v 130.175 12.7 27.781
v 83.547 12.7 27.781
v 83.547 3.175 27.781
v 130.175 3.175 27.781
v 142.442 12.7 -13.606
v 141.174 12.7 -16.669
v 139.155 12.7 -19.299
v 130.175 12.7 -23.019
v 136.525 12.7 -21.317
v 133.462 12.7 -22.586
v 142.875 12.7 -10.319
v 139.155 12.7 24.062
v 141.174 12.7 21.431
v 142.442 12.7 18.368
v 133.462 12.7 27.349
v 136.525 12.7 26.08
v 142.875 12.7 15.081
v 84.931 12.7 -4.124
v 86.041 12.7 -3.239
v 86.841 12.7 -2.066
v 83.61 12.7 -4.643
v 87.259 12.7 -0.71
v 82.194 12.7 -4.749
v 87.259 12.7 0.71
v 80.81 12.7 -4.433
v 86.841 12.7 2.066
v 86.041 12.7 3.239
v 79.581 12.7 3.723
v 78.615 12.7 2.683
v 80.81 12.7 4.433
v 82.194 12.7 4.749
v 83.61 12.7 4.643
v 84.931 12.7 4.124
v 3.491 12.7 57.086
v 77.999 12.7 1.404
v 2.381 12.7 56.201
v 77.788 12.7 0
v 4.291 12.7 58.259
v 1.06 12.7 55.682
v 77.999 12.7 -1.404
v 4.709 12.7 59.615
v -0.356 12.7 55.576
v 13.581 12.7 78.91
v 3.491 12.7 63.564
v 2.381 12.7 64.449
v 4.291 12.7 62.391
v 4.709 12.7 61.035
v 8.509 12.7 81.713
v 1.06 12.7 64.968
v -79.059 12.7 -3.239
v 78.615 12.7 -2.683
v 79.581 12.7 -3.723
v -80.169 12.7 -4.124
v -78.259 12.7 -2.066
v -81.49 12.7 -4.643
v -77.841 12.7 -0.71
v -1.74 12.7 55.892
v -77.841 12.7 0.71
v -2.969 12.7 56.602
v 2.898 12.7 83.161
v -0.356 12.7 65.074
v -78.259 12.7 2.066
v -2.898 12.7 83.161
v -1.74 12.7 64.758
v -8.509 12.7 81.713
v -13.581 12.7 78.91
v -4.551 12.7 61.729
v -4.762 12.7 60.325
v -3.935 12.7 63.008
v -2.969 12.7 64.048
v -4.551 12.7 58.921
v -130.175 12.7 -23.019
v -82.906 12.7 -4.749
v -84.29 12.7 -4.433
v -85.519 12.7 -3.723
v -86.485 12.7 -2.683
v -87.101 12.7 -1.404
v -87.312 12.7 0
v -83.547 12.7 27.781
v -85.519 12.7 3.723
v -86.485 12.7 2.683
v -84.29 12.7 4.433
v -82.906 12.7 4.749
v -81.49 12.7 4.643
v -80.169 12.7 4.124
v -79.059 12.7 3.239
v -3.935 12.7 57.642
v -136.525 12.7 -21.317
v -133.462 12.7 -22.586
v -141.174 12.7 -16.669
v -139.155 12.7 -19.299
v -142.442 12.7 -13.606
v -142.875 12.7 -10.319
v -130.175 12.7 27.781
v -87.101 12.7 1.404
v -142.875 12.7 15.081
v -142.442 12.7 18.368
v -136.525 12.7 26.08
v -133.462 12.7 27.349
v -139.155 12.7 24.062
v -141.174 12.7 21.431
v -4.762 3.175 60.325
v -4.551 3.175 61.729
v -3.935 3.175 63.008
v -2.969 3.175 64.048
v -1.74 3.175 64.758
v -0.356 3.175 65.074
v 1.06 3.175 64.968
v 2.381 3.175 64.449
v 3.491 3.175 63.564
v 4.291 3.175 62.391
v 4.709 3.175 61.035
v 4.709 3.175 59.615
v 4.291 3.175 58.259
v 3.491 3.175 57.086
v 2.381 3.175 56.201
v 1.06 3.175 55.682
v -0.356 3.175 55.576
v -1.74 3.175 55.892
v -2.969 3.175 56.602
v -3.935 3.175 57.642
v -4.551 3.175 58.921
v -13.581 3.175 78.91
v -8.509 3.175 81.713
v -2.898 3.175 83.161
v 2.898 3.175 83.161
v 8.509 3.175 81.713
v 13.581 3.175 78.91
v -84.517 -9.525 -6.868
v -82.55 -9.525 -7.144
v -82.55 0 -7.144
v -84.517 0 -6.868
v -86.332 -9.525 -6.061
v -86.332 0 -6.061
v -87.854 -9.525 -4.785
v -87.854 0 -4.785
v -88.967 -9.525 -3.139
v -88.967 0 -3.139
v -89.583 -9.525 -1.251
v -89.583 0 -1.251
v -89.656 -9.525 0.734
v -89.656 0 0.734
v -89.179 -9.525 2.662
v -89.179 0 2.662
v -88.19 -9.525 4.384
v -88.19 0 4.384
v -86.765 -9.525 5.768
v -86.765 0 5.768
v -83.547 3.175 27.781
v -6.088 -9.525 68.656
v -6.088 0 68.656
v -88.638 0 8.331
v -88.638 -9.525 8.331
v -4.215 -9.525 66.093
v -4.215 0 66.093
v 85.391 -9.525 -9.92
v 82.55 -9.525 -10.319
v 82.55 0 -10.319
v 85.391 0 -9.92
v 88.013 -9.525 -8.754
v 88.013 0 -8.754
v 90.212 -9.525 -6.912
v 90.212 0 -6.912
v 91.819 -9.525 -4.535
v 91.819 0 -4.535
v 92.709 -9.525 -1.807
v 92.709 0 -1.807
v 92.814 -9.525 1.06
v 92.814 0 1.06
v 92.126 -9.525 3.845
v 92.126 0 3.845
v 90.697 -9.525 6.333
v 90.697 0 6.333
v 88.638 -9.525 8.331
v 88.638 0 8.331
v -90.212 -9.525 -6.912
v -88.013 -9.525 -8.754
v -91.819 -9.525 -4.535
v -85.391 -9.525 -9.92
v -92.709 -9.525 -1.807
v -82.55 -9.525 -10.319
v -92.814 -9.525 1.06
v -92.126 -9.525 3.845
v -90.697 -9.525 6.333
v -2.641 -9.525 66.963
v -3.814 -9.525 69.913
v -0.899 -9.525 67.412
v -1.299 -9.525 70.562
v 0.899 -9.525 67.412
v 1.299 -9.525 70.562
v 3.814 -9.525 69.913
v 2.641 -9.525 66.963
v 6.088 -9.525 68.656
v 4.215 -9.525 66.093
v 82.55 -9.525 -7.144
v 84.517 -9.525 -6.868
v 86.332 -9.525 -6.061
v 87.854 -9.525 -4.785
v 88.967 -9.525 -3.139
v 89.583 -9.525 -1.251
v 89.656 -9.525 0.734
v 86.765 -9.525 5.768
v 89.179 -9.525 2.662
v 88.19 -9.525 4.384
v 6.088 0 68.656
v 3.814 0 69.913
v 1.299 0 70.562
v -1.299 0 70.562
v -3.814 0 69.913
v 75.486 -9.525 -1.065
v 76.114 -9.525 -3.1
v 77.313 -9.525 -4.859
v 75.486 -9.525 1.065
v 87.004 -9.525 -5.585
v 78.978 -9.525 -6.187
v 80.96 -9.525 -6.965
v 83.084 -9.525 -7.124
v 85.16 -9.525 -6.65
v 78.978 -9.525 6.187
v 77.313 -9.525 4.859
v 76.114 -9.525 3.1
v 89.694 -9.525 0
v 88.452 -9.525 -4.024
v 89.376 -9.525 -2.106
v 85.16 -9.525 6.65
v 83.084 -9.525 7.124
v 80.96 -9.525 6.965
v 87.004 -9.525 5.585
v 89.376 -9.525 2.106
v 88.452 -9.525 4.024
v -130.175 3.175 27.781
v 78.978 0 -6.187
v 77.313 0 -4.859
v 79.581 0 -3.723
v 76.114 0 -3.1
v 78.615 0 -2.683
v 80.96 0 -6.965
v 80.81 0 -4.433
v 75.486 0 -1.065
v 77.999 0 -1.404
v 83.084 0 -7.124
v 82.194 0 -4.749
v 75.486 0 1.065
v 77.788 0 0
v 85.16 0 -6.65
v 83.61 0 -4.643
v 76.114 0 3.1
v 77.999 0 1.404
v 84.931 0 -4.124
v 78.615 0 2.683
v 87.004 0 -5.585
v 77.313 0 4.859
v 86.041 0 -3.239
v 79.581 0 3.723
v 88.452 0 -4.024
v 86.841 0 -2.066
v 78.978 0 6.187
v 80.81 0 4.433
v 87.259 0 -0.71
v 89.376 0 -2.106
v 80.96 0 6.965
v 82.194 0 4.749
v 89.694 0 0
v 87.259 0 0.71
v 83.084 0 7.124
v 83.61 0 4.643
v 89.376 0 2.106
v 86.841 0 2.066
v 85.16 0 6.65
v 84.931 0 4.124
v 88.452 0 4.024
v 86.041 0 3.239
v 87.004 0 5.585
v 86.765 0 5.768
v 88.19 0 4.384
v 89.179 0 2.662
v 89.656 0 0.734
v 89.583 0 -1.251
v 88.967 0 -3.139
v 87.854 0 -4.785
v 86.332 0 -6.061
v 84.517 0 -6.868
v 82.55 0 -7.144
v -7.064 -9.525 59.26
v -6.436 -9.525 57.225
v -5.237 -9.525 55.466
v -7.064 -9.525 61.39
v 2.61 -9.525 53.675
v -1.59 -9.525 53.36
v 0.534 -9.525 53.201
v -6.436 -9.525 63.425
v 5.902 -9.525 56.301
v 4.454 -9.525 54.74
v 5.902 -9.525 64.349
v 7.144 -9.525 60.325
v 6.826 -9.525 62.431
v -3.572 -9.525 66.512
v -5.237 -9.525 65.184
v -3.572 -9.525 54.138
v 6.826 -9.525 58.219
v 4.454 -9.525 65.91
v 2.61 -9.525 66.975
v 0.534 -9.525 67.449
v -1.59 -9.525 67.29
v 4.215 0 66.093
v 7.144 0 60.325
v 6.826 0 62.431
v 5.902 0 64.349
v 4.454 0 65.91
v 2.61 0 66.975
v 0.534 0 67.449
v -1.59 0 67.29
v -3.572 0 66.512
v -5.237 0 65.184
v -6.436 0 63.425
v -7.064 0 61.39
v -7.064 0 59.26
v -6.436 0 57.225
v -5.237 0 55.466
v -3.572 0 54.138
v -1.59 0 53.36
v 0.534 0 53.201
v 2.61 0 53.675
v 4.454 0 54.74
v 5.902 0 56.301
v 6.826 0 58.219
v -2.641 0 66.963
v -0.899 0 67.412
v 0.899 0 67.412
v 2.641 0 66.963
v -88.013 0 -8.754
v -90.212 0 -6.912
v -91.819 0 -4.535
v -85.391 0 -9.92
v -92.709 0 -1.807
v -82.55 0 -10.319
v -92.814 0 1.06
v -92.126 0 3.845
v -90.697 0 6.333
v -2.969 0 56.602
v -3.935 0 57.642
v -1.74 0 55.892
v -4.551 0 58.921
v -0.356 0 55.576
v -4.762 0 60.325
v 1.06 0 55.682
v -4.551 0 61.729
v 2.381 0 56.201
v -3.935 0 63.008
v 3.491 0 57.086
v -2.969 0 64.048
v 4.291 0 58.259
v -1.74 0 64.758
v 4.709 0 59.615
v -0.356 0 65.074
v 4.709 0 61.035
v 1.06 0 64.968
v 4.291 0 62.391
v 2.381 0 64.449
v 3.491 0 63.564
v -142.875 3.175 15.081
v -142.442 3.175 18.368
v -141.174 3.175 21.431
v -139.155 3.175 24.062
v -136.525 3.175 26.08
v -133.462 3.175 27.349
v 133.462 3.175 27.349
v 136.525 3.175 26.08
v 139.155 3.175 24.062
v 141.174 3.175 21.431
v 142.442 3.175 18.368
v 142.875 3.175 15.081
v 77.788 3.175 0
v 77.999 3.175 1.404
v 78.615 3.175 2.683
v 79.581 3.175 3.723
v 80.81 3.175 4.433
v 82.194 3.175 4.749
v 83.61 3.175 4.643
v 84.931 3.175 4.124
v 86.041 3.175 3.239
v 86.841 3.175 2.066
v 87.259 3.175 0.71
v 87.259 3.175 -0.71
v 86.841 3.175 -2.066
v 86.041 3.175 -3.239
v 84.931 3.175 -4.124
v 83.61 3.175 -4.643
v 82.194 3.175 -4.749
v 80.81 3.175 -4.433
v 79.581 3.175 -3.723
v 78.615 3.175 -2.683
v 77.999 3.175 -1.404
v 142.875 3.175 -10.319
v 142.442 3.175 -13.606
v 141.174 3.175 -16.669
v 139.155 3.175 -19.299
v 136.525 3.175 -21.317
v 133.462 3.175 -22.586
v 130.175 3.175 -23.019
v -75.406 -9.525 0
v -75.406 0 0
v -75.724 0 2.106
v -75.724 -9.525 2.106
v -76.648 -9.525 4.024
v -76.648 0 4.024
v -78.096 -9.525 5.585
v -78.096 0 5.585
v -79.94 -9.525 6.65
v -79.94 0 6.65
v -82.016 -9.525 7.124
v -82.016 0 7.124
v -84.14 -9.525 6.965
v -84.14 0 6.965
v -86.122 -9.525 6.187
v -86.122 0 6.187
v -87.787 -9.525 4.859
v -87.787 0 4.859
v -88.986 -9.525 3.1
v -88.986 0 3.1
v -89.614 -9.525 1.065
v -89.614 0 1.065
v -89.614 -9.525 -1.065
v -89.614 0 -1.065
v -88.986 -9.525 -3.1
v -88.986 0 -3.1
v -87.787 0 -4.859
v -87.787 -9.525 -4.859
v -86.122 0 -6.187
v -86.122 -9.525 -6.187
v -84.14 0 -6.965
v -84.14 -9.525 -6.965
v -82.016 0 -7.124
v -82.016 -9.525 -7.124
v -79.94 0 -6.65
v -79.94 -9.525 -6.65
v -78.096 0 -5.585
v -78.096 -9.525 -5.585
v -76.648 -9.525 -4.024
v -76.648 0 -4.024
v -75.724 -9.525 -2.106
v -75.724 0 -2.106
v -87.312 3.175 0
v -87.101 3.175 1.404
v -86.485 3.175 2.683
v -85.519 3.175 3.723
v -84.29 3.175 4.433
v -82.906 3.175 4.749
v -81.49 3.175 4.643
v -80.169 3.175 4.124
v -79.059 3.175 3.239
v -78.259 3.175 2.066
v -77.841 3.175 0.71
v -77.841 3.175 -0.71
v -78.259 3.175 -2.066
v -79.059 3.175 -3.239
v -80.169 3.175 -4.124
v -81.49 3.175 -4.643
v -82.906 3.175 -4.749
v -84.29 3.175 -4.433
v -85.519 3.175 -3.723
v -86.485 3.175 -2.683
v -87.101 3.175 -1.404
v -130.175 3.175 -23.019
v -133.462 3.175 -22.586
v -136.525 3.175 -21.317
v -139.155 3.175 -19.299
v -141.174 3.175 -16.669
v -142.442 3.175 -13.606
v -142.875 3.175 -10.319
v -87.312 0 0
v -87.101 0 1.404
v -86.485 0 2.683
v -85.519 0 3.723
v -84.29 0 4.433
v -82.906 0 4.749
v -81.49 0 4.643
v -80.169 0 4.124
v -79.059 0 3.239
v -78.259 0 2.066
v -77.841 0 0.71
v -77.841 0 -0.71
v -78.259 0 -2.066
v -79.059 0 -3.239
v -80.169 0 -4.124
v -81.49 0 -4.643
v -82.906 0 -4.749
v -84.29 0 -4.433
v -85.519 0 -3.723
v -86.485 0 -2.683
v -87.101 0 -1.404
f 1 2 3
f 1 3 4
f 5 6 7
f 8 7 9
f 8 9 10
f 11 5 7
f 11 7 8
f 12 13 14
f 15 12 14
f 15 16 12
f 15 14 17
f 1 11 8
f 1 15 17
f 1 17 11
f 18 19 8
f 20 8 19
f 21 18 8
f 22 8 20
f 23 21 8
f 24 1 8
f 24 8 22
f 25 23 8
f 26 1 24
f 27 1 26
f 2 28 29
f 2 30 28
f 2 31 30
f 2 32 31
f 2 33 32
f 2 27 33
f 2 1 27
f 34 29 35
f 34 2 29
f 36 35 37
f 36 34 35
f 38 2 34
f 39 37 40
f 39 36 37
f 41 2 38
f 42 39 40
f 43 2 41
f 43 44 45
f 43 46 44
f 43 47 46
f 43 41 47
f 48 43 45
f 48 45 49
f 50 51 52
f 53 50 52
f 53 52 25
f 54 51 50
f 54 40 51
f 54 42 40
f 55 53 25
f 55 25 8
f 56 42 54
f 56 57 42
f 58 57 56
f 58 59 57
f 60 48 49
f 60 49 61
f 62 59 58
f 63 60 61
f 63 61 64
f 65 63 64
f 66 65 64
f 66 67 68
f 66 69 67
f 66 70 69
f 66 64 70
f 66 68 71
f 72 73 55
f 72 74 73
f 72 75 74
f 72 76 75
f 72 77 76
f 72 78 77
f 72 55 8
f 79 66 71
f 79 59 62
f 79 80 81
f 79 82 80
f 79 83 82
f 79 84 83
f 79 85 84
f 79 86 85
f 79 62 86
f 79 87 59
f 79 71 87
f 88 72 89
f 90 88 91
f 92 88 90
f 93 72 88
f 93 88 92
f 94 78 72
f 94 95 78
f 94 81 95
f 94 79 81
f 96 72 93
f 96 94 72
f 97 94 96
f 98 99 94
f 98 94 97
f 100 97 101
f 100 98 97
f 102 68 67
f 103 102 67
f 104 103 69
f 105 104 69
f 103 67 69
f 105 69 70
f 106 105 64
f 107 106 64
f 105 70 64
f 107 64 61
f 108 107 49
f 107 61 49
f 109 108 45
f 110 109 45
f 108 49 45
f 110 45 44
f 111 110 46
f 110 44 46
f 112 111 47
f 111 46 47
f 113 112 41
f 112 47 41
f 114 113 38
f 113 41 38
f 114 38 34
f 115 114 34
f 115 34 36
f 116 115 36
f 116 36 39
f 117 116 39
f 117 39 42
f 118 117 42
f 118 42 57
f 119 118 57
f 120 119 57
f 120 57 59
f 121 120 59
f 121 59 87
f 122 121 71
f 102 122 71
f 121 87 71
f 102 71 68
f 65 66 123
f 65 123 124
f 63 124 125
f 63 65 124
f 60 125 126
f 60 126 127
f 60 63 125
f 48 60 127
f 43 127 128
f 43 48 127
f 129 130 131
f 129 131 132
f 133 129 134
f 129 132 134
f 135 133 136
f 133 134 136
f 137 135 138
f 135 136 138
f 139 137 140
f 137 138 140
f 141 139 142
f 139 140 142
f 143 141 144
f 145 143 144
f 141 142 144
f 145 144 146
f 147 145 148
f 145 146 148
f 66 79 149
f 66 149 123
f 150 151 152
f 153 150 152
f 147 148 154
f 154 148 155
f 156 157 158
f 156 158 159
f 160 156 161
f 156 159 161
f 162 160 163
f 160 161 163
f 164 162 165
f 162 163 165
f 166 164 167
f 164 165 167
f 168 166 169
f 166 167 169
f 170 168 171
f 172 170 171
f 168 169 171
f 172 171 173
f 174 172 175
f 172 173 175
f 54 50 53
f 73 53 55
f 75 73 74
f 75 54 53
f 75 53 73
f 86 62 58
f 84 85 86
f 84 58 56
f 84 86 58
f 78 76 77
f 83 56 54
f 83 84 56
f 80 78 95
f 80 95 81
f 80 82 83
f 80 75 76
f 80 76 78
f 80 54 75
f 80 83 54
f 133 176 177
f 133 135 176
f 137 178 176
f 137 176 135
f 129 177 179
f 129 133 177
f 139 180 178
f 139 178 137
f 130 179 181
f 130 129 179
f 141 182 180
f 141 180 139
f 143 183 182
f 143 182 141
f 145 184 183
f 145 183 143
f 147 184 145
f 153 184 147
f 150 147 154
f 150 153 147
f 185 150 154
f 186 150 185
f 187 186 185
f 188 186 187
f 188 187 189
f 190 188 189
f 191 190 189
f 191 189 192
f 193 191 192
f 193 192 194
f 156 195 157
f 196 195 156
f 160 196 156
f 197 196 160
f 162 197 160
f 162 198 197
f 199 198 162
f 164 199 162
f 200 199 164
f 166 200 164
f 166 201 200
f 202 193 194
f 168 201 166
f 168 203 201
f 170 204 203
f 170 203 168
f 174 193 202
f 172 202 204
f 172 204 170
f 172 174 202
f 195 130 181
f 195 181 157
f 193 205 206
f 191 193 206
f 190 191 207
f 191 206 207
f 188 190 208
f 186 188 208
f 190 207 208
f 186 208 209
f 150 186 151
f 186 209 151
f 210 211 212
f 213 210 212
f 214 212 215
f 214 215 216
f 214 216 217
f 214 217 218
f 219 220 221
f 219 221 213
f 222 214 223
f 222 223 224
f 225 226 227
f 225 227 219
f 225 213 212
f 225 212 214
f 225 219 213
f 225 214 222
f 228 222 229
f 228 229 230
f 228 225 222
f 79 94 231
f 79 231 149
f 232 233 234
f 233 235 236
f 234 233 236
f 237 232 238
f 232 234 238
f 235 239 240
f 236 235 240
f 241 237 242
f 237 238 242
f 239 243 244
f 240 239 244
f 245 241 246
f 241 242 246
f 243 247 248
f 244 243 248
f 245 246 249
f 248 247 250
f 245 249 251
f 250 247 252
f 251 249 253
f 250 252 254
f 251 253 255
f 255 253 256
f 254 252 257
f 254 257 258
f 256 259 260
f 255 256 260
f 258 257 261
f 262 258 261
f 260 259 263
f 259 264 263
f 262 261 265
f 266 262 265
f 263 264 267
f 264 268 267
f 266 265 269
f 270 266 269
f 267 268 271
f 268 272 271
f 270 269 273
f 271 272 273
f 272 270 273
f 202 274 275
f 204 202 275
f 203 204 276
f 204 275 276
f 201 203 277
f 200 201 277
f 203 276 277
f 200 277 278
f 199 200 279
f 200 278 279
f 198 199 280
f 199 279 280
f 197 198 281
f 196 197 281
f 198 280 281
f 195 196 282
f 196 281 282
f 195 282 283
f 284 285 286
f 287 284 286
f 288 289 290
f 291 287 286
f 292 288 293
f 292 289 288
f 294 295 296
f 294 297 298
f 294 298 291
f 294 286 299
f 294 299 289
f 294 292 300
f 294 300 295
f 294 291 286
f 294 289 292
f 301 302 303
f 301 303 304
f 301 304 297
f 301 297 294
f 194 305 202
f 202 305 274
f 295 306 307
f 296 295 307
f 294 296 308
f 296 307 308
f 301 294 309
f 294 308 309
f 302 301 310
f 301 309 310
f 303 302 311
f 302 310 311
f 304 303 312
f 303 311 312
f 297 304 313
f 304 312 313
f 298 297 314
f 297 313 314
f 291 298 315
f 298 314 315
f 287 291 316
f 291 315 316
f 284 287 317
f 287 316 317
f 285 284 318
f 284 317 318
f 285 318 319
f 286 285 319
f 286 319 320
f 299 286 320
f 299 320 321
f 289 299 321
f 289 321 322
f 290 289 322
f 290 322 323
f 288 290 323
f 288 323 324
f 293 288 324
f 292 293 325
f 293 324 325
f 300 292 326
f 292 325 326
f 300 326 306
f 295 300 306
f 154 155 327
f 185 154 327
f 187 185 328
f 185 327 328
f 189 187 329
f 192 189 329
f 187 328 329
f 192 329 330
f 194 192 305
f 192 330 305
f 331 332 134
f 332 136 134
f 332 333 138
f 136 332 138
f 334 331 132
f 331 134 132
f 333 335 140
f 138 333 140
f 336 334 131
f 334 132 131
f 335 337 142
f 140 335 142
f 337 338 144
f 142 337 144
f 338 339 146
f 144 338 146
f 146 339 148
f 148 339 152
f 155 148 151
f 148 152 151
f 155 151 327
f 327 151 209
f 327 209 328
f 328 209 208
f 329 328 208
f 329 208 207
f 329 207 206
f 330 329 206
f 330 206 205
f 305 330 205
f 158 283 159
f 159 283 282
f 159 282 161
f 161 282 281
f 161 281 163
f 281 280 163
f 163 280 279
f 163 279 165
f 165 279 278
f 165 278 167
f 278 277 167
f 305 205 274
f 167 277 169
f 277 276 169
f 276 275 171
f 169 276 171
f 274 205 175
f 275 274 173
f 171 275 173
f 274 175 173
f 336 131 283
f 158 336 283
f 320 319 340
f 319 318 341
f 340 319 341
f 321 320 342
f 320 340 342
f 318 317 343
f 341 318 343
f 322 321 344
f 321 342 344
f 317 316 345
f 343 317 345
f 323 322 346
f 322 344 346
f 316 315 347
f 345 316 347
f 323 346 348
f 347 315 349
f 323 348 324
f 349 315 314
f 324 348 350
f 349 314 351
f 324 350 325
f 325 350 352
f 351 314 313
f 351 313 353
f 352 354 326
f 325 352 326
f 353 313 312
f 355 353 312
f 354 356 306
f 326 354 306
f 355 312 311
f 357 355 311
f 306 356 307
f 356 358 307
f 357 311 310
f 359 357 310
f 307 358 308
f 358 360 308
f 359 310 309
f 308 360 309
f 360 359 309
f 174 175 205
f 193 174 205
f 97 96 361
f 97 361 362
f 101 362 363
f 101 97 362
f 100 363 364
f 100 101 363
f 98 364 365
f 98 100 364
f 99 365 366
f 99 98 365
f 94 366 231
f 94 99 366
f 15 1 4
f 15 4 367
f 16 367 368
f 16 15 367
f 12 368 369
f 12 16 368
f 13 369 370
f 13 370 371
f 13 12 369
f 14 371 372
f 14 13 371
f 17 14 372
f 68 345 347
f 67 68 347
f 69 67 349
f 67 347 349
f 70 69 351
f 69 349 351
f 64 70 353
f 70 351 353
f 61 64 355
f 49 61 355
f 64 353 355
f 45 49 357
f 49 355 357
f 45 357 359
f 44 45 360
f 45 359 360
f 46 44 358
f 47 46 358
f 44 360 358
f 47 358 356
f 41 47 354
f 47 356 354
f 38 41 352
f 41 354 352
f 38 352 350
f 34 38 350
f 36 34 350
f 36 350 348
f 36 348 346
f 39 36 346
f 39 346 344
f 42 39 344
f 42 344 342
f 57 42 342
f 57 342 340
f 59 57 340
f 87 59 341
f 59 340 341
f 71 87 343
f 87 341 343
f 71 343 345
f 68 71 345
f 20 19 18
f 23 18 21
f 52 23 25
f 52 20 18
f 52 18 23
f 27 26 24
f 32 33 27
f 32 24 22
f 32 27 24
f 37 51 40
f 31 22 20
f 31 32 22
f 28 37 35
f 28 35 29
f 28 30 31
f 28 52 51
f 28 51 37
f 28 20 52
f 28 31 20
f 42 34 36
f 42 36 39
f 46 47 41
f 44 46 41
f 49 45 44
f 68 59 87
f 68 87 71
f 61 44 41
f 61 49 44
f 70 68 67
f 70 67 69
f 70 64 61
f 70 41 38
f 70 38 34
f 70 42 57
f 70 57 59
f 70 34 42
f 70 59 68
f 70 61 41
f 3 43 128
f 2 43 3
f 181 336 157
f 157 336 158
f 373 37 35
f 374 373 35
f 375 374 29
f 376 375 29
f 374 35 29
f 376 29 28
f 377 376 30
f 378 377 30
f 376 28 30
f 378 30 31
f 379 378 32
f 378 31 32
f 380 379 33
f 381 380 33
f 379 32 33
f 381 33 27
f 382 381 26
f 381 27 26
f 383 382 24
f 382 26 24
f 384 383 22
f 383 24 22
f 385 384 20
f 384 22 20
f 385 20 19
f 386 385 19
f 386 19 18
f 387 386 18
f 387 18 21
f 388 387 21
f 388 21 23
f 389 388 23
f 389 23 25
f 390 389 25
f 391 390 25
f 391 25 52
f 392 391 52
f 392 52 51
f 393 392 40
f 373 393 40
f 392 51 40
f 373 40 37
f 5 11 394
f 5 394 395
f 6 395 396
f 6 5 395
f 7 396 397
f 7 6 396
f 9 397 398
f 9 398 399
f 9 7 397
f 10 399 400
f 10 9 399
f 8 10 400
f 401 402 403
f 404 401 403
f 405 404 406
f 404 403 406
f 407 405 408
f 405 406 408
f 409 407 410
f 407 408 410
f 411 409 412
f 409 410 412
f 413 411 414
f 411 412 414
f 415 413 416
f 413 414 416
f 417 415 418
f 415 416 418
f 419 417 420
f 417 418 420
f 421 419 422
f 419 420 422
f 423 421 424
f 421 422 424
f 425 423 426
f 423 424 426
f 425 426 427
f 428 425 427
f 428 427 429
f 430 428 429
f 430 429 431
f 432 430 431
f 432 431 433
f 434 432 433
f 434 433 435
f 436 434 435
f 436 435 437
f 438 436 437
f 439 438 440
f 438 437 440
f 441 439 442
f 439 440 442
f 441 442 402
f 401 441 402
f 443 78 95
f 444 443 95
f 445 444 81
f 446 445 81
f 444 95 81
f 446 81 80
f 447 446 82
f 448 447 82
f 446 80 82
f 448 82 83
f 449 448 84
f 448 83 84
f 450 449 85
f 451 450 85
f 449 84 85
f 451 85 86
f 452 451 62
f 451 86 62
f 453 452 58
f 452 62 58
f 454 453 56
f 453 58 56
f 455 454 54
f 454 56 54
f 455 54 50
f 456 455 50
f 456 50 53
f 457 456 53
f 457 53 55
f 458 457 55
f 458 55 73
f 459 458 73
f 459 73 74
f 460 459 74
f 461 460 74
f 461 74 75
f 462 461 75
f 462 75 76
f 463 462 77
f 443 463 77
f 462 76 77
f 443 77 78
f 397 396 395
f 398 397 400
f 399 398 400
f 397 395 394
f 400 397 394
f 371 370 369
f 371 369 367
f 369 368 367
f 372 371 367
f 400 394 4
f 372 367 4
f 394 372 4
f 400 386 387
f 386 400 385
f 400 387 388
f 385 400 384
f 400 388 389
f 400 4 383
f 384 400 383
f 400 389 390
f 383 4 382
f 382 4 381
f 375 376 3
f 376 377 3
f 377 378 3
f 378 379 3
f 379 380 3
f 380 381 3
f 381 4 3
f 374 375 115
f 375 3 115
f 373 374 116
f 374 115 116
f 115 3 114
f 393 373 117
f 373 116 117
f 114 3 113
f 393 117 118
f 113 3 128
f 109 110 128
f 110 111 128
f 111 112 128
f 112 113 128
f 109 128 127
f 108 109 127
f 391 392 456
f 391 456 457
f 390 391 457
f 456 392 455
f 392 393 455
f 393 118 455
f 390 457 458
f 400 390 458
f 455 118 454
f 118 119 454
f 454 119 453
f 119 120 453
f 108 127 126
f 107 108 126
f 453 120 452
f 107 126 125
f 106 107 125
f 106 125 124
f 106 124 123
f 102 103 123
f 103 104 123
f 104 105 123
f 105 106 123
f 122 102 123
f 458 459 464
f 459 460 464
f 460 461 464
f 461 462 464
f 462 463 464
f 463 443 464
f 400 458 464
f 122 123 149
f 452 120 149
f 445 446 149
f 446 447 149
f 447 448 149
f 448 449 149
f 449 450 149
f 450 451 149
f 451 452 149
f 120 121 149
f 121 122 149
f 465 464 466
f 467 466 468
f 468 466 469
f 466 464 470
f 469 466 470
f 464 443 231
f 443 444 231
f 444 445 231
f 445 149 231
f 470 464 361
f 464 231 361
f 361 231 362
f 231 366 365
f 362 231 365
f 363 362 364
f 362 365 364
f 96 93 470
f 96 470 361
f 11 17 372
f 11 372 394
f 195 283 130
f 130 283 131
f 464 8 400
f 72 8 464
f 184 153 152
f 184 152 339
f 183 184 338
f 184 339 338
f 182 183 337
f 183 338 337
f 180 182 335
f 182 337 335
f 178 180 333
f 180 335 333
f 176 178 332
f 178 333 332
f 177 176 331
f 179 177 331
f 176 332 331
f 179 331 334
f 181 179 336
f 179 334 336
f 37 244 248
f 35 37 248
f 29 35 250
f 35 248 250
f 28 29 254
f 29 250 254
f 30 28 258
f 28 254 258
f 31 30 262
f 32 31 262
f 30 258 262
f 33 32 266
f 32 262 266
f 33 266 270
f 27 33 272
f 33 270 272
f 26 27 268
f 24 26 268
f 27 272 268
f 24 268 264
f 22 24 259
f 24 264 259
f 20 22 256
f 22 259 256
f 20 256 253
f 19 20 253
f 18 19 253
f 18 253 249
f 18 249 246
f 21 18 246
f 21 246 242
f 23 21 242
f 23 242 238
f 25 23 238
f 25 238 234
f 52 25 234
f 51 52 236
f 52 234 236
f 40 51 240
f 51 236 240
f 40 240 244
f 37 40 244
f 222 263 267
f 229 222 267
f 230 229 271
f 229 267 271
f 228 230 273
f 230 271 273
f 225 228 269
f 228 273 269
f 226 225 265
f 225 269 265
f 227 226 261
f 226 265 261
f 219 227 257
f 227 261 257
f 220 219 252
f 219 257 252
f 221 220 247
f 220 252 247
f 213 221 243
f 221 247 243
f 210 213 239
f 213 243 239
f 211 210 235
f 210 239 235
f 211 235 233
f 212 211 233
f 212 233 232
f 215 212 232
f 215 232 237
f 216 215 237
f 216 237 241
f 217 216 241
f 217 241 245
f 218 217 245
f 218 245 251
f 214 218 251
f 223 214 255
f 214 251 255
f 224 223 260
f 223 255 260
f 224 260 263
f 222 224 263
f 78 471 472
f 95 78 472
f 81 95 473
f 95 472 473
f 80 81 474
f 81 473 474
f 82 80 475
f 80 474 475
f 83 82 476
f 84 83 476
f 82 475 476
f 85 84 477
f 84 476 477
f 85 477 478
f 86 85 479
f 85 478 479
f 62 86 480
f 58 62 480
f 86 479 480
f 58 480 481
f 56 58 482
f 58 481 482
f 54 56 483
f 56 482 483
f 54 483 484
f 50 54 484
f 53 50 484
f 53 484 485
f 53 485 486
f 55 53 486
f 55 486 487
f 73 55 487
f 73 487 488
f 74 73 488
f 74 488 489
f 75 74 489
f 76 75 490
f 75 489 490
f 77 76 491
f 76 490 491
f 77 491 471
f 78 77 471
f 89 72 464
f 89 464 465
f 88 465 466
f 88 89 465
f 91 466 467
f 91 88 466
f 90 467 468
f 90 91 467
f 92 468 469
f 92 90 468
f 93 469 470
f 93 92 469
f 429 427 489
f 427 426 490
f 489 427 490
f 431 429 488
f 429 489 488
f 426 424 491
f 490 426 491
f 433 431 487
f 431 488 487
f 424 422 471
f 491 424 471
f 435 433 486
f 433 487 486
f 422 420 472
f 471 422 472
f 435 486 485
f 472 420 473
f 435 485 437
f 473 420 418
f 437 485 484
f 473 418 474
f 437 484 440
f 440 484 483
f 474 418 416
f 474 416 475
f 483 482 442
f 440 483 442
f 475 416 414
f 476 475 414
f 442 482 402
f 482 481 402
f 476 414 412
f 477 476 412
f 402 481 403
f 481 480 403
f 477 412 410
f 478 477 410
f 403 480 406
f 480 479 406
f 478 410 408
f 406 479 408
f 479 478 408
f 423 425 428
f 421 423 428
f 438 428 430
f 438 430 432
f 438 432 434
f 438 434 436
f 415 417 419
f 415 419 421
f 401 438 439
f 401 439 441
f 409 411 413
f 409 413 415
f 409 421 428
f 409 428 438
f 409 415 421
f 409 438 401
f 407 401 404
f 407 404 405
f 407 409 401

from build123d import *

# Parameters (mm, degrees)
F0_R     = 7.14375
F1_DEPTH = 9.525
F3_DEPTH = 9.525
F4_R     = 4.7625
F5_DEPTH = 12.7
F6_R     = 4.7625
F7_DEPTH = 9.525


with BuildPart() as f1:
    # F0 (on Front) → F1 (new body)
    with BuildSketch(Plane.XZ):
        with Locations((0, 60.325)):
            Circle(F0_R)
        with Locations((-82.55, 0)):
            Circle(F0_R)
        with Locations((82.55, 0)):
            Circle(F0_R)
    extrude(amount=F1_DEPTH)

    # F4 (on face) → F5 (join)
    with BuildSketch(Plane(origin=(0, 0, 0), x_dir=(-1, 0, 0), z_dir=(0, 1, 0))):
        with Locations((-82.55, 0)):
            Circle(F4_R)
        with Locations((82.55, 0)):
            Circle(F4_R)
        with Locations((0, 60.325)):
            Circle(F4_R)
    extrude(amount=F5_DEPTH)


with BuildPart() as f3:
    # F2 (on Front) → F3 (new body, through all)
    with BuildSketch(Plane.XZ):
        with BuildLine():
            Line((-6.088234, 68.656267), (-88.638234, 8.331267))
            ThreePointArc((-88.638234, 8.331267), (-92.359303, -3.202213), (-82.55, -10.31875))
            Line((-82.55, -10.31875), (82.55, -10.31875))
            ThreePointArc((82.55, -10.31875), (92.359303, -3.202213), (88.638234, 8.331267))
            Line((88.638234, 8.331267), (6.088234, 68.656267))
            ThreePointArc((6.088234, 68.656267), (0, 70.64375), (-6.088234, 68.656267))
        make_face()
        with BuildLine():
            ThreePointArc((-82.55, -7.14375), (-89.341056, -2.216917), (-86.764931, 5.7678))
            Line((-86.764931, 5.7678), (-4.214931, 66.0928))
            ThreePointArc((-4.214931, 66.0928), (0, 67.46875), (4.214931, 66.0928))
            Line((4.214931, 66.0928), (86.764931, 5.7678))
            ThreePointArc((86.764931, 5.7678), (89.341056, -2.216917), (82.55, -7.14375))
            Line((82.55, -7.14375), (-82.55, -7.14375))
        make_face(mode=Mode.SUBTRACT)
    extrude(amount=F3_DEPTH)


with BuildPart() as f7:
    # F6 (on face) → F7 (new body)
    with BuildSketch(Plane(origin=(0, 12.7, 0), x_dir=(-1, 0, 0), z_dir=(0, 1, 0))):
        with BuildLine():
            ThreePointArc((-142.875, -10.31875), (-139.155256, -19.299006), (-130.175, -23.01875))
            Line((-130.175, -23.01875), (130.175, -23.01875))
            ThreePointArc((130.175, -23.01875), (139.155256, -19.299006), (142.875, -10.31875))
            Line((142.875, -10.31875), (142.875, 15.08125))
            ThreePointArc((142.875, 15.08125), (139.155256, 24.061506), (130.175, 27.78125))
            Line((130.175, 27.78125), (83.547286, 27.78125))
            Line((83.547286, 27.78125), (13.581444, 78.910134))
            ThreePointArc((13.581444, 78.910134), (0, 83.34375), (-13.581444, 78.910134))
            Line((-13.581444, 78.910134), (-83.547286, 27.78125))
            Line((-83.547286, 27.78125), (-130.175, 27.78125))
            ThreePointArc((-130.175, 27.78125), (-139.155256, 24.061506), (-142.875, 15.08125))
            Line((-142.875, 15.08125), (-142.875, -10.31875))
        make_face()
        with Locations((-82.55, 0)):
            Circle(F6_R, mode=Mode.SUBTRACT)
        with Locations((82.55, 0)):
            Circle(F6_R, mode=Mode.SUBTRACT)
        with Locations((0, 60.325)):
            Circle(F6_R, mode=Mode.SUBTRACT)
    extrude(amount=-F7_DEPTH)


solid = Compound([f1.part, f3.part, f7.part])
